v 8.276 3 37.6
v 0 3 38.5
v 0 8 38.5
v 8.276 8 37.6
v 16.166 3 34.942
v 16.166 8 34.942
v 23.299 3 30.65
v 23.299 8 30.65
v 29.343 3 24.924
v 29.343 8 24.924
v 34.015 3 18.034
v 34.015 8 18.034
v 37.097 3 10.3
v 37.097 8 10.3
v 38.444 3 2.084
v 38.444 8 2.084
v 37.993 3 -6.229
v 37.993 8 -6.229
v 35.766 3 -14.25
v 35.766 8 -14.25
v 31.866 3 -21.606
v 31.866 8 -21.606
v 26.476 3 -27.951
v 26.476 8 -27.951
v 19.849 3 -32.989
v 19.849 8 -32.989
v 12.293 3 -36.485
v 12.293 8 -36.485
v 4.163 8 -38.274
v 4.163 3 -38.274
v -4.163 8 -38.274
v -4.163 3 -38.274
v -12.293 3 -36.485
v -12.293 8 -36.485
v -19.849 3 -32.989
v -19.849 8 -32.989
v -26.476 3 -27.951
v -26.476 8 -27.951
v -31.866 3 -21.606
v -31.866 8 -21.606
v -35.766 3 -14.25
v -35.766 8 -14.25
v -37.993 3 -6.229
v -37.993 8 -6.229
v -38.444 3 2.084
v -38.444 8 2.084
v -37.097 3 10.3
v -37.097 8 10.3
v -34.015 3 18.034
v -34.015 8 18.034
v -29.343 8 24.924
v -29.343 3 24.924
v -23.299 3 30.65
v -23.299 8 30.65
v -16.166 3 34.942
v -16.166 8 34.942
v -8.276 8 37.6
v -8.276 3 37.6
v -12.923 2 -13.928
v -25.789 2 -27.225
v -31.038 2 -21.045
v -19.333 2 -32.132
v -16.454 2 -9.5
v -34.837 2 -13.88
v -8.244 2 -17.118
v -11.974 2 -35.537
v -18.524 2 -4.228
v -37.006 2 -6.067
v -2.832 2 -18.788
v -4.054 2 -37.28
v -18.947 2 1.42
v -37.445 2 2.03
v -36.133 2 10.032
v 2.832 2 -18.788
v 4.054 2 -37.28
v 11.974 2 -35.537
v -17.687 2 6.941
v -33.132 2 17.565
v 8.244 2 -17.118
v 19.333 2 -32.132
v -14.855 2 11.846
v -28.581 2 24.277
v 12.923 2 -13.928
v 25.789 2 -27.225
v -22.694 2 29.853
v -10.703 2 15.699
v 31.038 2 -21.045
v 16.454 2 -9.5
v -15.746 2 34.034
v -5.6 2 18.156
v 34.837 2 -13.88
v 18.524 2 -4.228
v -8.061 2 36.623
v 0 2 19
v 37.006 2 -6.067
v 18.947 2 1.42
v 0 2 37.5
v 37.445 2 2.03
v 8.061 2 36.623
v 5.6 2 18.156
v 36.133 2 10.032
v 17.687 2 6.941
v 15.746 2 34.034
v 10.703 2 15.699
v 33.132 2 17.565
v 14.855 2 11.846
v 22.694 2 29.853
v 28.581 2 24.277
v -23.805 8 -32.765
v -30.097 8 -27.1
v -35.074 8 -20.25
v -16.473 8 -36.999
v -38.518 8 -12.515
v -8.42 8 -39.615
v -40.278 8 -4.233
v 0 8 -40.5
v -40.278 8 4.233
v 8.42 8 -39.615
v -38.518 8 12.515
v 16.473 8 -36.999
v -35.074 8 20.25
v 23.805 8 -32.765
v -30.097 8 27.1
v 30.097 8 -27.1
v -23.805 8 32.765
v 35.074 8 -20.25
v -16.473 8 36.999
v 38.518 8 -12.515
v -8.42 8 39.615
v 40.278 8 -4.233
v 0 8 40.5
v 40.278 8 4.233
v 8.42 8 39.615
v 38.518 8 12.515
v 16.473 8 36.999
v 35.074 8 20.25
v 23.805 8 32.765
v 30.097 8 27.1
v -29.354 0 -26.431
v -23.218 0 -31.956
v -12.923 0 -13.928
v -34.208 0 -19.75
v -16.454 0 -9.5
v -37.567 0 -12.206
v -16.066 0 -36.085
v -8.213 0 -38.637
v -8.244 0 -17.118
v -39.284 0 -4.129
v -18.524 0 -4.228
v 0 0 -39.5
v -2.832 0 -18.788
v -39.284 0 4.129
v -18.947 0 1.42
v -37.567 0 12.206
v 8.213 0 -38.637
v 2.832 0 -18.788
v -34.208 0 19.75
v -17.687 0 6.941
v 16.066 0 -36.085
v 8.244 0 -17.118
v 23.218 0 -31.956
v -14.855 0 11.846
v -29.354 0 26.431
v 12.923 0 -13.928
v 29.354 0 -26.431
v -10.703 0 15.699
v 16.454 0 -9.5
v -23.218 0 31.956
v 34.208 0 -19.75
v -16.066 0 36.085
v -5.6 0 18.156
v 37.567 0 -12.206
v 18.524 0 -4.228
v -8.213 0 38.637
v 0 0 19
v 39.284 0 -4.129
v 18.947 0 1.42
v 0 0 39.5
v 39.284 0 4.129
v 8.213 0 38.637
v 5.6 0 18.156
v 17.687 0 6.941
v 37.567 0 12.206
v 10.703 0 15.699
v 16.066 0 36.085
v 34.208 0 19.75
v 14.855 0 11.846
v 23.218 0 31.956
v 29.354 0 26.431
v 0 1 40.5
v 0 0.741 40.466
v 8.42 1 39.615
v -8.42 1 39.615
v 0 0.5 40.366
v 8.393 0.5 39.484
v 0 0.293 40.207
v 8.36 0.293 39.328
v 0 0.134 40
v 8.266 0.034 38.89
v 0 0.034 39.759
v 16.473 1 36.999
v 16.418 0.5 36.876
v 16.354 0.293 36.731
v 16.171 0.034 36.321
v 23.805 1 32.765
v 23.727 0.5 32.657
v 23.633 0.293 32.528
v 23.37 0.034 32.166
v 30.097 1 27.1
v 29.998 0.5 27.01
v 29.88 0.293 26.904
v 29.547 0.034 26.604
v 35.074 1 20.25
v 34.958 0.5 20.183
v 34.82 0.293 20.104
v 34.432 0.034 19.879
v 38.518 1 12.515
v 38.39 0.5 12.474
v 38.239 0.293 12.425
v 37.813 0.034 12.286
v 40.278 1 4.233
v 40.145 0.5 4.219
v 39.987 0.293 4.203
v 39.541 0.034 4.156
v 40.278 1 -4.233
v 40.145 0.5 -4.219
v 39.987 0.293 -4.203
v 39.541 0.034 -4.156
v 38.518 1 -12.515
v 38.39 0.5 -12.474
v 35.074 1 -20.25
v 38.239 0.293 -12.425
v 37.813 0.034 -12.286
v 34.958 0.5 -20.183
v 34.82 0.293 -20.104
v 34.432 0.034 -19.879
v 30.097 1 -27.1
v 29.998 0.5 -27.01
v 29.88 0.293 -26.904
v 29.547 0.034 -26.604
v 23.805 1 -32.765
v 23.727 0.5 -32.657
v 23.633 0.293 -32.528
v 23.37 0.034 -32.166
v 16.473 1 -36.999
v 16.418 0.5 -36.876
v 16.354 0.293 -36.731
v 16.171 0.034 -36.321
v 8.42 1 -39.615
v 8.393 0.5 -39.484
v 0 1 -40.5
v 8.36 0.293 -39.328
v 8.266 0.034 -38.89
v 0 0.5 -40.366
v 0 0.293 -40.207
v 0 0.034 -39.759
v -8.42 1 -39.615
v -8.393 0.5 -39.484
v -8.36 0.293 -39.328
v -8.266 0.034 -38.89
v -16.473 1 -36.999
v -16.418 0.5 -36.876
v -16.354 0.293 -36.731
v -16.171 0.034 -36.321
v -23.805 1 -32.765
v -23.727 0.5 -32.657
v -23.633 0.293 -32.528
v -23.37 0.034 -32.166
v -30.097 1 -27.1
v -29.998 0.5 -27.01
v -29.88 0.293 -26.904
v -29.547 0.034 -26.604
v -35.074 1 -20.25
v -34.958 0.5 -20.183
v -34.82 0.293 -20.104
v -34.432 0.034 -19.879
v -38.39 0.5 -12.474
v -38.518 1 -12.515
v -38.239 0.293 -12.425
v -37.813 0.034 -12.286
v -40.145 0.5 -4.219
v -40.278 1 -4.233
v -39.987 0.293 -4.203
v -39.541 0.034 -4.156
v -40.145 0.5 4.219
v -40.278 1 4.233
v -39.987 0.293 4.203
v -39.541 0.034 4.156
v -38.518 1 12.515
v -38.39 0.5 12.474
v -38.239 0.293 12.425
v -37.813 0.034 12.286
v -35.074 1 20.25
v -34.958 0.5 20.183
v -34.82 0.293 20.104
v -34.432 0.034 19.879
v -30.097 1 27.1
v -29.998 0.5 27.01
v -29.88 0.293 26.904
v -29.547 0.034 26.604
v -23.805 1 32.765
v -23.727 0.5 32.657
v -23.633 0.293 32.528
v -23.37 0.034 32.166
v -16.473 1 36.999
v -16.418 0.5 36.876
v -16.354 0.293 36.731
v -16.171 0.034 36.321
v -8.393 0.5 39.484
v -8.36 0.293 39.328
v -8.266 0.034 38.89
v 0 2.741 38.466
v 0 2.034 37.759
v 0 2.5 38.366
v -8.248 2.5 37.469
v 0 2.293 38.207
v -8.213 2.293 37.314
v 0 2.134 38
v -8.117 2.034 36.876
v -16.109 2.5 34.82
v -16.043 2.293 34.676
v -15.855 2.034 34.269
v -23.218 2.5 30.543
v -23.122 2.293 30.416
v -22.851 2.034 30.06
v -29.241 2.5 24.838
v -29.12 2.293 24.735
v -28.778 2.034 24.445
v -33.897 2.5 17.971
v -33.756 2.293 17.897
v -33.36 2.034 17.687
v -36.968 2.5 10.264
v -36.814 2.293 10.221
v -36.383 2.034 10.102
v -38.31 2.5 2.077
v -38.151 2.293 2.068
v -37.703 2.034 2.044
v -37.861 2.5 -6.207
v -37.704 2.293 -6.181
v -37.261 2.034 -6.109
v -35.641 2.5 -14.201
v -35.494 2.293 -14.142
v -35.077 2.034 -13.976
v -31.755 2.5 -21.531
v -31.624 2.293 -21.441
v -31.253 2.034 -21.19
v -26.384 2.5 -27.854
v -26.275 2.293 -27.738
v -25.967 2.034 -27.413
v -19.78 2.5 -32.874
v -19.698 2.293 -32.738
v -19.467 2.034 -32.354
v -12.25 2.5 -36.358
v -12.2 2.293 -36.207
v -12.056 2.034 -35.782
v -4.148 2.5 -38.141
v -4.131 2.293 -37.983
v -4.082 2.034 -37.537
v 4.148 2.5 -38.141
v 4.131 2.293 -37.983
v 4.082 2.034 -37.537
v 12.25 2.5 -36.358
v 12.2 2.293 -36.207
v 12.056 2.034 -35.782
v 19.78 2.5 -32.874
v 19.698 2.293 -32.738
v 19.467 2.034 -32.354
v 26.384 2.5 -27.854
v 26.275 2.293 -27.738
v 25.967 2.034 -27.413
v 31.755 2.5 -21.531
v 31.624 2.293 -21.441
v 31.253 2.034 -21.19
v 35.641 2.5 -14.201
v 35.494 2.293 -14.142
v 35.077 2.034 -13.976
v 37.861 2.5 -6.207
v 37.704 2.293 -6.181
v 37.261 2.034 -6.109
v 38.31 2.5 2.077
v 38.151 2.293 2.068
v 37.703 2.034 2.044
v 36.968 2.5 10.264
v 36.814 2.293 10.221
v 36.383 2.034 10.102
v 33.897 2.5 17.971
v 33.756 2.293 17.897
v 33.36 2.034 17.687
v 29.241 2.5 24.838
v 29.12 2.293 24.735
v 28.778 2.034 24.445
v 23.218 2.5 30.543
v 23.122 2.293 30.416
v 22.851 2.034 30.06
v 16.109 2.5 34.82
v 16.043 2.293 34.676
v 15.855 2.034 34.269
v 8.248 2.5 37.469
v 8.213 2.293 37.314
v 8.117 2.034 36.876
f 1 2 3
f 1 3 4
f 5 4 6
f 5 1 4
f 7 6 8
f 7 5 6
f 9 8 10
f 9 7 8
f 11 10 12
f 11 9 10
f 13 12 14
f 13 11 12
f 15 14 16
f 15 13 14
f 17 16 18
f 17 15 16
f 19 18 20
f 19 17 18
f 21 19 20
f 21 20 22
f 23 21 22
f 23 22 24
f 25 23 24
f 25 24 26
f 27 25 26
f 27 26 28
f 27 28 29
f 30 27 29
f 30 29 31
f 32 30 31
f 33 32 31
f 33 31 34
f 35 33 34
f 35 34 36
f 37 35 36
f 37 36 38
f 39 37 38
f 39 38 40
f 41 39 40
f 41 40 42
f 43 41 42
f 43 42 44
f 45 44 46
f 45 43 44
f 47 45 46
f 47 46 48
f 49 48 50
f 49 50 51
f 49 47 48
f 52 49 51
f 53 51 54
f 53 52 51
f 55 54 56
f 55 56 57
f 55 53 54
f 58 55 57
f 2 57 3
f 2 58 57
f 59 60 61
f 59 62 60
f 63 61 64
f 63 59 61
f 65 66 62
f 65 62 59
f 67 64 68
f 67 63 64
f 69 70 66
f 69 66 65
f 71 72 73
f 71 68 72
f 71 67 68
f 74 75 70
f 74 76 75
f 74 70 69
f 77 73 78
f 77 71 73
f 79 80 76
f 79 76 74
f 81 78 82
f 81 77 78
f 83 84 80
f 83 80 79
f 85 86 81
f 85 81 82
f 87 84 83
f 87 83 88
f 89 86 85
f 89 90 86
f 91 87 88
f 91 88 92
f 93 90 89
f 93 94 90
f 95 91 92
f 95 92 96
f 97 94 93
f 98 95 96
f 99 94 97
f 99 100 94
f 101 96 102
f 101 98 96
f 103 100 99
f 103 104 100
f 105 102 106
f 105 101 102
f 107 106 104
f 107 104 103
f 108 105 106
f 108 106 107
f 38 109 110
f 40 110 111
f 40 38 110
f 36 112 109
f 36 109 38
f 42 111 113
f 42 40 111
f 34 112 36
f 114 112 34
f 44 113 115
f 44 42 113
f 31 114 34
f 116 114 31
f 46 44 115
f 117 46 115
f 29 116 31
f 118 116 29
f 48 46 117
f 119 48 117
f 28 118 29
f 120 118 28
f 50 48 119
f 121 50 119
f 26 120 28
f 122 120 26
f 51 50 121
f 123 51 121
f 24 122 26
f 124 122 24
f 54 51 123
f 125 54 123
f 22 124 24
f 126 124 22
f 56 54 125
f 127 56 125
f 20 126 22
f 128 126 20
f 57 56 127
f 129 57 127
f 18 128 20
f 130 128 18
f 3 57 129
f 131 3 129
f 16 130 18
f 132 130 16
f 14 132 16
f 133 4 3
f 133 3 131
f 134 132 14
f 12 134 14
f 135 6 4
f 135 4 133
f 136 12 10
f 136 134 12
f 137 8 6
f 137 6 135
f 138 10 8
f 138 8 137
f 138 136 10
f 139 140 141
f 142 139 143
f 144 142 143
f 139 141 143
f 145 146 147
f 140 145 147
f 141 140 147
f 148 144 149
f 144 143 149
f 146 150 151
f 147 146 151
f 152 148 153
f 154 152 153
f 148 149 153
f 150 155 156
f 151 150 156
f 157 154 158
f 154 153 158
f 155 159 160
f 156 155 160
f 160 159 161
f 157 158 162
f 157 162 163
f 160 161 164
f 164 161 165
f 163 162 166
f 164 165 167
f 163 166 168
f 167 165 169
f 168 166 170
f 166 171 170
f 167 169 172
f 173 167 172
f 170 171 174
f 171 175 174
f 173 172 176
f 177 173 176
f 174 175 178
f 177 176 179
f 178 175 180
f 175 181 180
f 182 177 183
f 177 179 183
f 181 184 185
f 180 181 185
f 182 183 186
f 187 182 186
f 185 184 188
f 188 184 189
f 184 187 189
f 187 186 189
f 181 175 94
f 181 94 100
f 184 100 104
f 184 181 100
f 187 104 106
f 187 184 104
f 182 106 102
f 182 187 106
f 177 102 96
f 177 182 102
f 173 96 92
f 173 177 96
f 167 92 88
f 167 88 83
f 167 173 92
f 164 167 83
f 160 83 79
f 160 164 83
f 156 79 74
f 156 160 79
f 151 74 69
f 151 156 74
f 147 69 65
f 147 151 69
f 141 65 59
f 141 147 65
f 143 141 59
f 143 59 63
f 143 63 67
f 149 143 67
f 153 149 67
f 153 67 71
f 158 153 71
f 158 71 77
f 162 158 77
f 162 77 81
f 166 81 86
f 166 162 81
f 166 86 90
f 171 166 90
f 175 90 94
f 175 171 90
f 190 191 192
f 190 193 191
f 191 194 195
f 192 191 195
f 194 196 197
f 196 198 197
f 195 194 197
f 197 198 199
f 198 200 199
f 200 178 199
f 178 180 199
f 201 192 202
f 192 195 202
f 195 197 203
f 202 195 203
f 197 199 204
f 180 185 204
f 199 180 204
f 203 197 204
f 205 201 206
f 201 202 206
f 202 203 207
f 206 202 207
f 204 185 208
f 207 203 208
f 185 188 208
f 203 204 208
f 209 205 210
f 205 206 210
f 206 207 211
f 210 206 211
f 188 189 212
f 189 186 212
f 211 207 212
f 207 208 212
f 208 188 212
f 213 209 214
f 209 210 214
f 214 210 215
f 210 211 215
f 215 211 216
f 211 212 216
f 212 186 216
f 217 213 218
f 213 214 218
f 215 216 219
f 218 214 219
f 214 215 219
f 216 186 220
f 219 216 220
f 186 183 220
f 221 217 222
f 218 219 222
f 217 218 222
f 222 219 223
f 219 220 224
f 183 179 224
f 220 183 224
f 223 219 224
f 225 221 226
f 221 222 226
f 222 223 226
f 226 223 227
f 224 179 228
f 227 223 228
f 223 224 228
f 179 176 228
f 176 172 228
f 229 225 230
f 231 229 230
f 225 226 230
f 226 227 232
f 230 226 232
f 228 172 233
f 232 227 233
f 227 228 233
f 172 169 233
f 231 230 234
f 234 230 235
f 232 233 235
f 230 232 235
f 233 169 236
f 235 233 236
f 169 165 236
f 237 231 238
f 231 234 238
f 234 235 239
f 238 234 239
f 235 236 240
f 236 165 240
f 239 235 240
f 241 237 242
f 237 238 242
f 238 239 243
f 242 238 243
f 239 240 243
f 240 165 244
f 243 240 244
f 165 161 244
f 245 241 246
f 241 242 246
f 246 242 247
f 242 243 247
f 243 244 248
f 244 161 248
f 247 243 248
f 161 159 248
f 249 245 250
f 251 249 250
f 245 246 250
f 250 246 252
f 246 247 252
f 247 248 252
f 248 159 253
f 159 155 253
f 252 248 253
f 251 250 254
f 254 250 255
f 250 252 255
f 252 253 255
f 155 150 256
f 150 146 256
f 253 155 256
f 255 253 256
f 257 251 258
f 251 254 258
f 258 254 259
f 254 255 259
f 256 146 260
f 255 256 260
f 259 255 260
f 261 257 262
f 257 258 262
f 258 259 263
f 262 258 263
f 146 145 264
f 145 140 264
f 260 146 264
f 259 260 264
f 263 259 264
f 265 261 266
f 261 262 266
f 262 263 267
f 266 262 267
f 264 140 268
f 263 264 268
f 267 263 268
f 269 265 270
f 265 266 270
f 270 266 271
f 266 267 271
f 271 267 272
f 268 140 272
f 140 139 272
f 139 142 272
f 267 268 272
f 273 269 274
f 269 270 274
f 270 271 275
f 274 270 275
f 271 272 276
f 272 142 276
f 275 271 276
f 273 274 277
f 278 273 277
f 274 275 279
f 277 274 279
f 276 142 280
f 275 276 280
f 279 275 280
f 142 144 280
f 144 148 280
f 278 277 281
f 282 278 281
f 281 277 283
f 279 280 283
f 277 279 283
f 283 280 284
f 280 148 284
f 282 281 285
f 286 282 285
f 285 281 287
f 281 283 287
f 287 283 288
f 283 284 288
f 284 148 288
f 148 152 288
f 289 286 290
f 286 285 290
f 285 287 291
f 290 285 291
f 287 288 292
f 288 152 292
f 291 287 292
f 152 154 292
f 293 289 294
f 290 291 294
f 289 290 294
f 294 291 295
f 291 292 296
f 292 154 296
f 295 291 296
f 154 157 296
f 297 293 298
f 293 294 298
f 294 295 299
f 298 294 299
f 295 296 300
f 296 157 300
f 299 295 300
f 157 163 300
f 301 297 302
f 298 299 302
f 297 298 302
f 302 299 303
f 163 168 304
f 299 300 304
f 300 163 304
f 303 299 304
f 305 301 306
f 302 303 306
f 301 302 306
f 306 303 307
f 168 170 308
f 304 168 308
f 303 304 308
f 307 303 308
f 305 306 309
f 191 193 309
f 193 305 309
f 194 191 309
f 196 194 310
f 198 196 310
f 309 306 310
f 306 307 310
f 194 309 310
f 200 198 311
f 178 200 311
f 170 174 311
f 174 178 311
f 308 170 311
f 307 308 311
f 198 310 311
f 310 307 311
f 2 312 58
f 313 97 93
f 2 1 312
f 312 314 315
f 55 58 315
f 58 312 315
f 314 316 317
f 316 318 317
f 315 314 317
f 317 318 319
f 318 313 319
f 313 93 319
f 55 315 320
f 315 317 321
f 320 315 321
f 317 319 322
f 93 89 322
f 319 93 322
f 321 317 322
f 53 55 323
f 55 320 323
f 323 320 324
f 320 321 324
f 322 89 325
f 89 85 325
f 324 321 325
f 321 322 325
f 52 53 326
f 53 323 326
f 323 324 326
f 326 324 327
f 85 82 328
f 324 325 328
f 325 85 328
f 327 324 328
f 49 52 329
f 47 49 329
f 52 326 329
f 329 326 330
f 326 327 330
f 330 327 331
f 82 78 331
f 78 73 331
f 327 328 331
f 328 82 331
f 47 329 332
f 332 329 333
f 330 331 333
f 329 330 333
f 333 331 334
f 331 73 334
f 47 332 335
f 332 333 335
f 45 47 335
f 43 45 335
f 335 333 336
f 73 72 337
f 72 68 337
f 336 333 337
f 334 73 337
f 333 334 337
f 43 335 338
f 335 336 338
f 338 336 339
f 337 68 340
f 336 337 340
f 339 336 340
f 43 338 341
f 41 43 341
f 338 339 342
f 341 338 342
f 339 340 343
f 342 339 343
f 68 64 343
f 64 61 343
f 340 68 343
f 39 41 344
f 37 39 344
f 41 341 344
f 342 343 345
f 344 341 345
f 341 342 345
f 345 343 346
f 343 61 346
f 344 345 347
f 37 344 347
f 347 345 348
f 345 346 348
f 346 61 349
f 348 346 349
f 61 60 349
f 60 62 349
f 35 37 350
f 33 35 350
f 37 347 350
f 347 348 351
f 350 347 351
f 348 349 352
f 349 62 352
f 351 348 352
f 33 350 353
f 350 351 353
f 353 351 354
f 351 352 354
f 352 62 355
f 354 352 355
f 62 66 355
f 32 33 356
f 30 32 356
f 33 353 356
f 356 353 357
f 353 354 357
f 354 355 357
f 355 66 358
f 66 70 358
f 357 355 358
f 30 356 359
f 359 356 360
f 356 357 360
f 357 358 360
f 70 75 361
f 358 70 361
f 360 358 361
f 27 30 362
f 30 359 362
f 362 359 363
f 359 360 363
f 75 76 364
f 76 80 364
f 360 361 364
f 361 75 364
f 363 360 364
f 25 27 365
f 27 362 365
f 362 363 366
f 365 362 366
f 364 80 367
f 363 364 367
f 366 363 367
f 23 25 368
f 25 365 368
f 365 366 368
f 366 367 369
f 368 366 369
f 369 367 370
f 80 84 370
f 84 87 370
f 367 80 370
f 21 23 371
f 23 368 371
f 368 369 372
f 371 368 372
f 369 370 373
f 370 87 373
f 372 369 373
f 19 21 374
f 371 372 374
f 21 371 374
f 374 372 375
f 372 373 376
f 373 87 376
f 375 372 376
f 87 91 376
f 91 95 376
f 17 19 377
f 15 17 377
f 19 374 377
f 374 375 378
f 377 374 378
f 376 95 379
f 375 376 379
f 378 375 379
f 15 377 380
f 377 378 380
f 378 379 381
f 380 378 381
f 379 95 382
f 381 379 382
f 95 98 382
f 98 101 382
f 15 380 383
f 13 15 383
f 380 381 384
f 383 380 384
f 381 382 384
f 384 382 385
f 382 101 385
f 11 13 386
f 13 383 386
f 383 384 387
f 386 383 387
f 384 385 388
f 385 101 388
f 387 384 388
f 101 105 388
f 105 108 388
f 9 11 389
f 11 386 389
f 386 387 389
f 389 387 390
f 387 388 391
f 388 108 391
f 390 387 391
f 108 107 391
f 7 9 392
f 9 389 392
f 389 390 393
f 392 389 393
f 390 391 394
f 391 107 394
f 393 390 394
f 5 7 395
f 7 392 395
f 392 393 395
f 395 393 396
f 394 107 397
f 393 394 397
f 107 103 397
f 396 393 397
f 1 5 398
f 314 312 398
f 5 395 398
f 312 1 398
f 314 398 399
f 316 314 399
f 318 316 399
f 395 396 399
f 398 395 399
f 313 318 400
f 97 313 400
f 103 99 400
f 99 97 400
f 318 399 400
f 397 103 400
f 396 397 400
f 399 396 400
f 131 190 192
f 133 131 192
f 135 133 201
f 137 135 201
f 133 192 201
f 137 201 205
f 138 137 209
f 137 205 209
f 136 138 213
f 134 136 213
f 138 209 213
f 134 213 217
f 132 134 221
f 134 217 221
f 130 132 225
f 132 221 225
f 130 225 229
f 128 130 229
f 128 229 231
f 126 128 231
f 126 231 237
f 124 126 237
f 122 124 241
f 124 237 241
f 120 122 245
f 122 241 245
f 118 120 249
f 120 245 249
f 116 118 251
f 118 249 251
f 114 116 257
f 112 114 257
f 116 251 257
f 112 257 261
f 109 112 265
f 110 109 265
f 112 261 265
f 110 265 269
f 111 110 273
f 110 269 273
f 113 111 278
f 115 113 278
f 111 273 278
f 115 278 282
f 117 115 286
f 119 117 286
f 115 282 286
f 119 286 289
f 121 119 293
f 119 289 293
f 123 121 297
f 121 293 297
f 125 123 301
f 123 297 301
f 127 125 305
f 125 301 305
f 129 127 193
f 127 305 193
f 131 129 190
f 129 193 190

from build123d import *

# Parameters (mm, degrees)
SKETCH1_R           = 40.5
SKETCH1_R_2         = 19
BOSS_EXTRUDE1_DEPTH = 2
SKETCH1_3_R         = 40.5
SKETCH1_3_R_2       = 38.5
BOSS_EXTRUDE2_DEPTH = 8
FILLET1_R           = 1
FILLET2_R           = 1


with BuildPart() as part:
    # Sketch1 → Boss-Extrude1 (new body)
    with BuildSketch(Plane(origin=(0, 0, 0), x_dir=(1, 0, 0), z_dir=(0, 1, 0))):
        Circle(SKETCH1_R)
        Circle(SKETCH1_R_2, mode=Mode.SUBTRACT)
    extrude(amount=BOSS_EXTRUDE1_DEPTH)

    # Sketch1<3> → Boss-Extrude2 (add)
    with BuildSketch(Plane(origin=(0, 0, 0), x_dir=(1, 0, 0), z_dir=(0, 1, 0))):
        Circle(SKETCH1_3_R)
        Circle(SKETCH1_3_R_2, mode=Mode.SUBTRACT)
    extrude(amount=BOSS_EXTRUDE2_DEPTH)

    # Fillet1
    fillet1_edges = [part.edges().sort_by_distance(p)[0] for p in [
        (-40.5, 0, 0),
    ]]
    fillet(fillet1_edges, radius=FILLET1_R)

    # Fillet2
    fillet2_edges = [part.edges().sort_by_distance(p)[0] for p in [
        (-38.5, 2, 0),
    ]]
    fillet(fillet2_edges, radius=FILLET2_R)


solid = part.part
